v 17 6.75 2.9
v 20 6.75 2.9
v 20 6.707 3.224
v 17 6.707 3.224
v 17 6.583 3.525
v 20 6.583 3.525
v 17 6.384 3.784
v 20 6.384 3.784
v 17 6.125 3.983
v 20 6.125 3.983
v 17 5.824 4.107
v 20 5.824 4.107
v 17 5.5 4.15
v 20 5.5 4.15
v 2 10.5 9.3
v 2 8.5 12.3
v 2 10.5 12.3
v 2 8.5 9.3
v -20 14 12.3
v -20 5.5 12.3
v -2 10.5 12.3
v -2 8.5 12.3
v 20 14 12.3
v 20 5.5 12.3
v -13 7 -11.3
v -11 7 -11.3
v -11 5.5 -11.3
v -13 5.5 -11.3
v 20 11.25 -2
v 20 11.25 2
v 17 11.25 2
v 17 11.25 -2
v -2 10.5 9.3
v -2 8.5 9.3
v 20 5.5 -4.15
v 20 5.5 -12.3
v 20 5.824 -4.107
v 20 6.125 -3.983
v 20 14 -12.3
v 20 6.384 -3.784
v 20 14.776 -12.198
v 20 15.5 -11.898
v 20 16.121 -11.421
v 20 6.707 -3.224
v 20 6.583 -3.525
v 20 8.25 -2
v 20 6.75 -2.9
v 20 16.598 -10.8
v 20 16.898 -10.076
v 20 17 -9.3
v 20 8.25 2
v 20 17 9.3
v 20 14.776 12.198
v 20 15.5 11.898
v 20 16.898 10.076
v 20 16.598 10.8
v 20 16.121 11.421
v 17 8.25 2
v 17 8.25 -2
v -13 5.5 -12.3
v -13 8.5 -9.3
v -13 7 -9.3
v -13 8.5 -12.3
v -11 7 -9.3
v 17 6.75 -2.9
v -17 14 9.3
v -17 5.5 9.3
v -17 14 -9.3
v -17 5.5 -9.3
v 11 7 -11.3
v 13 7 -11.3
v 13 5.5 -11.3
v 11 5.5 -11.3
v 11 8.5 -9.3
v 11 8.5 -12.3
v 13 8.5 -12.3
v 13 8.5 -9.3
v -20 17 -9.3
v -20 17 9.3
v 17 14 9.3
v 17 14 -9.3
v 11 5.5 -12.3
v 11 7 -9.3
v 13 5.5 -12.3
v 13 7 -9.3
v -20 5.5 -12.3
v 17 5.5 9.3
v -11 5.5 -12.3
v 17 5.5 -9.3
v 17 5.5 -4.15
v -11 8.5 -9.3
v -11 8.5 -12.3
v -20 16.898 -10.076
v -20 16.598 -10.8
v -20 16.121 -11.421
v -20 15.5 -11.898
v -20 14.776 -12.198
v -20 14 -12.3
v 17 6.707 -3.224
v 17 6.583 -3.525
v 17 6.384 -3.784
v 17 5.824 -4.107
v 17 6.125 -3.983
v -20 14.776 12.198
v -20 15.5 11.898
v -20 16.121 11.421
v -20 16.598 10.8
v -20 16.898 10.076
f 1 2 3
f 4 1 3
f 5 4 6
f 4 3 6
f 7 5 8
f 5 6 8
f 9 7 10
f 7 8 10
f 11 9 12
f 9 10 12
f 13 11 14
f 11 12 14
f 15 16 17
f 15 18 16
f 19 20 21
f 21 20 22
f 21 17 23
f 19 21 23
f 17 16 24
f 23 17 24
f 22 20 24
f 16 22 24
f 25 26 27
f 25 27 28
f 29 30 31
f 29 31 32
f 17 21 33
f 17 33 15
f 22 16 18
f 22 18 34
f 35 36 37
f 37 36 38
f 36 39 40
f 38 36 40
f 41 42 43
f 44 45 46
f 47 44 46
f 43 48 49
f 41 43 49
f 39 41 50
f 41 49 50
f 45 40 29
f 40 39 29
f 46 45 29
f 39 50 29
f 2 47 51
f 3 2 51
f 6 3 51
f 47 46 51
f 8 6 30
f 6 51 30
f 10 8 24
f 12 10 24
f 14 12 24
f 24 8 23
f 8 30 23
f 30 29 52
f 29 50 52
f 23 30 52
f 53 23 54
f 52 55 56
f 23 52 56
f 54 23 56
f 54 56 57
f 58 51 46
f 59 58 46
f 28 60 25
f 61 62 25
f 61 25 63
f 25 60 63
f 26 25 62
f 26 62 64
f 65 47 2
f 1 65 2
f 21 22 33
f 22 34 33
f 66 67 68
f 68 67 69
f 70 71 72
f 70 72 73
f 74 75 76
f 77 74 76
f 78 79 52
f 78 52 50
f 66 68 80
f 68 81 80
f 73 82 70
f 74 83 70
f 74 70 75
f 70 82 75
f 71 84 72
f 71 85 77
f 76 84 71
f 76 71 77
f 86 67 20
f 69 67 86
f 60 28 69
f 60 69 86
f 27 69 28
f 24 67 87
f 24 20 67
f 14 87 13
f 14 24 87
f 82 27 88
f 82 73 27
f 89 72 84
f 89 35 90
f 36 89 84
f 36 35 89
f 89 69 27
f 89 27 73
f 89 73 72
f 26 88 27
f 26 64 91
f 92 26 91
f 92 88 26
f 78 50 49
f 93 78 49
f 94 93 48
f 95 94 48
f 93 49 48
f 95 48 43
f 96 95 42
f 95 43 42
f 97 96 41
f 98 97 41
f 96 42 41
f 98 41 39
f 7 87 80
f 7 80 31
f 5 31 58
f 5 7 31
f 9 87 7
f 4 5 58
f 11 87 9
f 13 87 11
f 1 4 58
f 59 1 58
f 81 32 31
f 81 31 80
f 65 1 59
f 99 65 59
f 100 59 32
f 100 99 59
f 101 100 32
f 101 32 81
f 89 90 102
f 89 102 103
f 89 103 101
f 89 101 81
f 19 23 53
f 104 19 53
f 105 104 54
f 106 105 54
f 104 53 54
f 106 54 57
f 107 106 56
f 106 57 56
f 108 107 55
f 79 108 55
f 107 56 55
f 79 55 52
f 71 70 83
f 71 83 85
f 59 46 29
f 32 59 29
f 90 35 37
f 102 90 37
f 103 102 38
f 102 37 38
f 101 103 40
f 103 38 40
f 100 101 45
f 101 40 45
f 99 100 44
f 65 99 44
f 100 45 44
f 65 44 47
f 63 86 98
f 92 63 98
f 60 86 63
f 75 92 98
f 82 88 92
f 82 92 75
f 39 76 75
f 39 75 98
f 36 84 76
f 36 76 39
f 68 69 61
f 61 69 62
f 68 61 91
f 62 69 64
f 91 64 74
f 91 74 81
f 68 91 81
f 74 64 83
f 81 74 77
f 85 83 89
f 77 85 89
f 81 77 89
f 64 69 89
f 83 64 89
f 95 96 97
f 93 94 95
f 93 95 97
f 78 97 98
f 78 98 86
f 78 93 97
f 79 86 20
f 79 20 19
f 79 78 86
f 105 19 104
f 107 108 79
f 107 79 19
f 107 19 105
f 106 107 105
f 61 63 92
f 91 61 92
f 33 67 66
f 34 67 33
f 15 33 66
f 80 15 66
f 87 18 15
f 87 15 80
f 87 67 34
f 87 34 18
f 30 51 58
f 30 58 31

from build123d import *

# Parameters (mm, degrees)
SKETCH1_W            = 40
SKETCH1_H            = 24.6
SKETCH1_W_2          = 34
SKETCH1_H_2          = 18.6
BOSS_EXTRUDE1_DEPTH  = 14
CUT_EXTRUDE1_DEPTH   = 10
SKETCH5_W            = 4
SKETCH5_H            = 3
CUT_EXTRUDE2_DEPTH   = 10
BOSS_EXTRUDE2_DEPTH  = 40
BOSS_EXTRUDE3_DEPTH  = 40
SKETCH8_W            = 4
SKETCH8_H            = 12
BOSS_EXTRUDE4_DEPTH  = 1
FILLET4_R            = 21
SKETCH10_W           = 4
SKETCH10_H           = 2
BOSS_EXTRUDE6_DEPTH  = 1
SKETCH13_W           = 2
SKETCH13_H           = 3
BOSS_EXTRUDE7_DEPTH  = 1
SKETCH14_W           = 2
SKETCH14_H           = 1.5
BOSS_EXTRUDE9_DEPTH  = 1
SKETCH14_4_W         = 2
SKETCH14_4_H         = 1.5
BOSS_EXTRUDE10_DEPTH = 1
CUT_EXTRUDE5_DEPTH   = 28
CUT_EXTRUDE6_DEPTH   = 28
FILLET7_R            = 0.25
SKETCH18_W           = 34
SKETCH18_H           = 18.6
BOSS_EXTRUDE11_DEPTH = 1.25
CUT_EXTRUDE7_DEPTH   = 5.25
SKETCH20_W           = 4
SKETCH20_H           = 2
CUT_EXTRUDE8_DEPTH   = 5.25
SKETCH21_W           = 2
SKETCH21_H           = 1.5
CUT_EXTRUDE9_DEPTH   = 5.25


with BuildPart() as part:
    # Sketch1 → Boss-Extrude1 (new body)
    with BuildSketch(Plane(origin=(0, 0, 0), x_dir=(1, 0, 0), z_dir=(0, 1, 0))):
        Rectangle(SKETCH1_W, SKETCH1_H)
        Rectangle(SKETCH1_W_2, SKETCH1_H_2, mode=Mode.SUBTRACT)
    extrude(amount=BOSS_EXTRUDE1_DEPTH)

    # Sketch3 → Cut-Extrude1 (cut)
    with BuildSketch(Plane(origin=(20, 0, 0), x_dir=(0, 0, -1), z_dir=(1, 0, 0))):
        with BuildLine():
            ThreePointArc((2.9, 4.25), (4.15, 5.5), (2.9, 6.75))
            Line((2.9, 6.75), (-2.9, 6.75))
            ThreePointArc((-2.9, 6.75), (-4.15, 5.5), (-2.9, 4.25))
            Line((-2.9, 4.25), (2.9, 4.25))
        make_face()
    extrude(amount=-CUT_EXTRUDE1_DEPTH, mode=Mode.SUBTRACT)


with BuildPart() as body_2:
    # Split1: the piece on the far side of the plane
    add(part.part)
    split(bisect_by=Plane(origin=(0, 5.5, 0), x_dir=(0, 0, -1), z_dir=(0, -1, 0)), keep=Keep.BOTTOM)

    # Sketch5 → Cut-Extrude2 (cut)
    with BuildSketch(Plane(origin=(20, 0, 0), x_dir=(0, 0, -1), z_dir=(1, 0, 0))):
        with Locations((0, 9.75)):
            Rectangle(SKETCH5_W, SKETCH5_H)
    extrude(amount=-CUT_EXTRUDE2_DEPTH, mode=Mode.SUBTRACT)

    # Sketch6 → Boss-Extrude2 (add)
    with BuildSketch(Plane(origin=(20, 0, 0), x_dir=(0, 0, -1), z_dir=(1, 0, 0))):
        with BuildLine():
            Line((-9.3, 17), (9.3, 17))
            ThreePointArc((9.3, 17), (11.421320344, 16.121320344), (12.3, 14))
            Line((12.3, 14), (-12.3, 14))
            ThreePointArc((-12.3, 14), (-11.421320344, 16.121320344), (-9.3, 17))
        make_face()
    extrude(amount=-BOSS_EXTRUDE2_DEPTH)


with BuildPart() as part_1:
    add(part.part)

    # Split1
    split(bisect_by=Plane(origin=(0, 5.5, 0), x_dir=(0, 0, -1), z_dir=(0, -1, 0)), keep=Keep.TOP)

    # Sketch7 → Boss-Extrude3 (add)
    with BuildSketch(Plane.ZY.offset(20)):
        with BuildLine():
            Line((-9.3, -3), (9.3, -3))
            ThreePointArc((9.3, -3), (11.421320344, -2.121320344), (12.3, 0))
            Line((12.3, 0), (-12.3, 0))
            ThreePointArc((-12.3, 0), (-11.421320344, -2.121320344), (-9.3, -3))
        make_face()
    extrude(amount=-BOSS_EXTRUDE3_DEPTH)

    # Sketch8 → Boss-Extrude4 (add)
    with BuildSketch(Plane.XY.offset(12.3)):
        with Locations((0, 6.5)):
            Rectangle(SKETCH8_W, SKETCH8_H)
    extrude(amount=BOSS_EXTRUDE4_DEPTH)

    # Fillet4
    # the kernel refuses this fillet: 21 mm, written as the material it takes off along each edge
    with BuildSketch(Plane(origin=(18.007810594, 0.5, 13.3), x_dir=(0, 0, -1), z_dir=(-1, 0, 0))) as fillet4_piece_1:
        with BuildLine():
            CenterArc((21, -6.403124237), FILLET4_R, 162.247209838, 17.752790162)
            Line((0, -6.403124237), (-0.42, -6.403124237))
            Line((-0.42, -6.403124237), (-0.42, 0))
            Line((-0.42, 0), (0, 0.42))
            ThreePointArc((0, 0.42), (0.5, 0.42), (0.6, 0.128062485))
            Line((0.6, 0.128062485), (1, 0))
        make_face()
    extrude(amount=36.015621187, mode=Mode.SUBTRACT)

    # Sketch10 → Boss-Extrude6 (add)
    with BuildSketch(Plane(origin=(0, 0, 12.3), x_dir=(-1, 0, 0), z_dir=(0, 0, -1))):
        with Locations((0, 9.5)):
            Rectangle(SKETCH10_W, SKETCH10_H)
    extrude(amount=BOSS_EXTRUDE6_DEPTH)

    # Sketch13 → Boss-Extrude7 (add)
    with BuildSketch(Plane(origin=(0, 0, -12.3), x_dir=(-1, 0, 0), z_dir=(0, 0, -1))):
        with Locations((-12, 7)):
            Rectangle(SKETCH13_W, SKETCH13_H)
        with Locations((12, 7)):
            Rectangle(SKETCH13_W, SKETCH13_H)
    extrude(amount=-BOSS_EXTRUDE7_DEPTH)

    # Sketch14 → Boss-Extrude9 (add)
    with BuildSketch(Plane.XY.offset(-11.3)):
        with Locations((12, 7.75)):
            Rectangle(SKETCH14_W, SKETCH14_H)
    extrude(amount=BOSS_EXTRUDE9_DEPTH)

    # Sketch14<4> → Boss-Extrude10 (add)
    with BuildSketch(Plane.XY.offset(-11.3)):
        with Locations((-12, 7.75)):
            Rectangle(SKETCH14_4_W, SKETCH14_4_H)
        with Locations((12, 7.75)):
            Rectangle(SKETCH14_4_W, SKETCH14_4_H)
    extrude(amount=BOSS_EXTRUDE10_DEPTH)

    # Sketch15 → Cut-Extrude5 (cut)
    with BuildSketch(Plane(origin=(13, 0, 0), x_dir=(0, 0, -1), z_dir=(1, 0, 0))):
        Polygon((10.3, 7), (11.3, 8.5), (10.3, 8.5), align=None)
    extrude(amount=-CUT_EXTRUDE5_DEPTH, mode=Mode.SUBTRACT)

    # Sketch16 → Cut-Extrude6 (cut)
    with BuildSketch(Plane(origin=(2, 0, 0), x_dir=(0, 0, -1), z_dir=(1, 0, 0))):
        Polygon((-13.3, 12.5), (-12.3, 10.5), (-12.3, 12.5), align=None)
    extrude(amount=-CUT_EXTRUDE6_DEPTH, mode=Mode.SUBTRACT)

    # Fillet7
    fillet7_edges = [part_1.edges().sort_by_distance(p)[0] for p in [
        (0, 12.5, 13.3),
    ]]
    fillet(fillet7_edges, radius=FILLET7_R)

    # Sketch18 → Boss-Extrude11 (add)
    with BuildSketch(Plane(origin=(0, 0, 0), x_dir=(1, 0, 0), z_dir=(0, 1, 0))):
        Rectangle(SKETCH18_W, SKETCH18_H)
    extrude(amount=BOSS_EXTRUDE11_DEPTH)

    # Sketch19 → Cut-Extrude7 (cut)
    with BuildSketch(Plane.ZY.offset(2)):
        Polygon((12.3, 10.5), (11.3, 8.5), (11.3, 10.5), align=None)
    extrude(amount=-CUT_EXTRUDE7_DEPTH, mode=Mode.SUBTRACT)


with BuildPart() as body_2_1:
    add(body_2.part)

    # Combine3: cut part
    add(part_1.part, mode=Mode.SUBTRACT)

    # Sketch20 → Cut-Extrude8 (cut)
    with BuildSketch(Plane.XY.offset(12.3)):
        with Locations((0, 9.5)):
            Rectangle(SKETCH20_W, SKETCH20_H)
    extrude(amount=-CUT_EXTRUDE8_DEPTH, mode=Mode.SUBTRACT)

    # Sketch21 → Cut-Extrude9 (cut)
    with BuildSketch(Plane(origin=(0, 0, -12.3), x_dir=(-1, 0, 0), z_dir=(0, 0, -1))):
        with Locations((-12, 7.75)):
            Rectangle(SKETCH21_W, SKETCH21_H)
        with Locations((12, 7.75)):
            Rectangle(SKETCH21_W, SKETCH21_H)
    extrude(amount=-CUT_EXTRUDE9_DEPTH, mode=Mode.SUBTRACT)


solid = body_2_1.part
